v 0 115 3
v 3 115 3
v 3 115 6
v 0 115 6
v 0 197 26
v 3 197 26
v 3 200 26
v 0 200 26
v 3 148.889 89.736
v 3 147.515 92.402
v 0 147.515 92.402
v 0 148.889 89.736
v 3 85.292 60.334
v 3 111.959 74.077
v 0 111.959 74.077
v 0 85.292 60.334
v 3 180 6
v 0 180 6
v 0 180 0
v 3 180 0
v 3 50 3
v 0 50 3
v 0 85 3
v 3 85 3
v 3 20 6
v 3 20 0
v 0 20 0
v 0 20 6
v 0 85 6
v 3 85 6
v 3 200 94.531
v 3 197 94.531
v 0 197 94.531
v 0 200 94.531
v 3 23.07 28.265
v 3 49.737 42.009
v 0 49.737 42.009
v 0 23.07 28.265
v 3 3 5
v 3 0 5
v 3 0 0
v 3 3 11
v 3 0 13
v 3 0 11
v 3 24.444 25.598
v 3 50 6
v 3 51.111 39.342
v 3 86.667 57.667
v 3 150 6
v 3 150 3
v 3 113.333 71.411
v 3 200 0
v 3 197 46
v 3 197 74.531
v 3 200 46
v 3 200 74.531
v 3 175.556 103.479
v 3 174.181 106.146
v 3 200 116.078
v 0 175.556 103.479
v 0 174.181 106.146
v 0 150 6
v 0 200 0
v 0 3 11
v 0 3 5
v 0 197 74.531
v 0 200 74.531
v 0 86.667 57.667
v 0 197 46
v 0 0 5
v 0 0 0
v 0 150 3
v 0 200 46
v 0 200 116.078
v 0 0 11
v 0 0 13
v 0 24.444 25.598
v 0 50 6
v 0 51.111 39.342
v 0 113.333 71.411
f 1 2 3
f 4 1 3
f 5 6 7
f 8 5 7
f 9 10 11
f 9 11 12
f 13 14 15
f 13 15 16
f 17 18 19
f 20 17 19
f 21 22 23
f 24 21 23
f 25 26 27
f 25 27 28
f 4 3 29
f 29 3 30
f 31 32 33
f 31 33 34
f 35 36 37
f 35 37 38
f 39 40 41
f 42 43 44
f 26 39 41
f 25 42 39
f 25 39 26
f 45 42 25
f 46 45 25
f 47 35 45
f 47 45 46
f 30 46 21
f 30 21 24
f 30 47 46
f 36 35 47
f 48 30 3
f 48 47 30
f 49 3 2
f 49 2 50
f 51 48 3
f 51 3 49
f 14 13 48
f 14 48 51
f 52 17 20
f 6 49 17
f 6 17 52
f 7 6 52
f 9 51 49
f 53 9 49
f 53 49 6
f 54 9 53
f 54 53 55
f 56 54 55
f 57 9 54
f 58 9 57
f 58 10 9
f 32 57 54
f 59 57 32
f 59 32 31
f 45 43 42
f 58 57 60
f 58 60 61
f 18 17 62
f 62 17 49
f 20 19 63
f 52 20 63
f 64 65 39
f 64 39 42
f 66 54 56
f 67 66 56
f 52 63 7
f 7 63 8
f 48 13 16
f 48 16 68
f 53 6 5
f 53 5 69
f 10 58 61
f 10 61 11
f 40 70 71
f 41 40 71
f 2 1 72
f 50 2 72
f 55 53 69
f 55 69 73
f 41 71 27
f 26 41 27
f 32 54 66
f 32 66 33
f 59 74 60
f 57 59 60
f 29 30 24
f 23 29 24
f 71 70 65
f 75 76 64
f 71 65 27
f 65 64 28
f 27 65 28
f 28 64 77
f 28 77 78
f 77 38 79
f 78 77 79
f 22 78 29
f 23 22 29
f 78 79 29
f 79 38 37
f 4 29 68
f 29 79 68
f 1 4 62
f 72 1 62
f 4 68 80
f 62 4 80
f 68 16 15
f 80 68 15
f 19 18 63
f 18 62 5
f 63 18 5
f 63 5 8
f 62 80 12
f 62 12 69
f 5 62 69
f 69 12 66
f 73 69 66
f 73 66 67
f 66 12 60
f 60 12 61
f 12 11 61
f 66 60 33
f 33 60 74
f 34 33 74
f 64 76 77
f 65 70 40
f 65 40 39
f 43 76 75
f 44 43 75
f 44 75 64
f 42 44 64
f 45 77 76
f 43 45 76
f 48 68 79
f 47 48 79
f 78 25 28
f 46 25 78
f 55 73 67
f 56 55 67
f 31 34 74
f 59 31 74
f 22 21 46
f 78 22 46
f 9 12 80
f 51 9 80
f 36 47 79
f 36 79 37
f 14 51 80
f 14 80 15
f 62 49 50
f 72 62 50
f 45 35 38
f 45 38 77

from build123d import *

# Parameters (mm, degrees)
F1_DEPTH = 3
F2_W     = 3
F2_H     = 6
F3_DEPTH = 3.001
F4_W     = 30
F4_H     = 3
F5_DEPTH = 3.001
F6_W     = 3
F6_H     = 20
F7_DEPTH = 3.001
F9_DEPTH = 3


with BuildPart() as f1:
    # F0 (on Right) → F1 (new body)
    with BuildSketch(Plane.YZ):
        Polygon((200, 116.077641), (0, 13), (0, 0), (20, 0), (20, 3), (180, 3), (180, 0), (200, 0), (200, 13), align=None)
    extrude(amount=F1_DEPTH)

    # F2 (on Right) → F3 (cut, through all)
    with BuildSketch(Plane.YZ):
        with Locations((1.5, 8)):
            Rectangle(F2_W, F2_H)
    extrude(amount=F3_DEPTH, mode=Mode.SUBTRACT)

    # F4 (on face) → F5 (cut, through all)
    with BuildSketch(Plane.YZ.offset(3)):
        Polygon((115, 3), (115, 4.5), (115, 6), (85, 6), (85, 3), align=None)
        Polygon((180, 6), (150, 6), (150, 4.5), (150, 3), (180, 3), align=None)
        with Locations((35, 4.5)):
            Rectangle(F4_W, F4_H)
    extrude(amount=-F5_DEPTH, mode=Mode.SUBTRACT)

    # F6 (on face) → F7 (cut, through all)
    with BuildSketch(Plane.YZ.offset(3)):
        with Locations((198.5, 84.531476)):
            Rectangle(F6_W, F6_H)
        with Locations((198.5, 36)):
            Rectangle(F6_W, F6_H)
    extrude(amount=-F7_DEPTH, mode=Mode.SUBTRACT)

    # F8 (on face) → F9 (join, through all)
    with BuildSketch(Plane.YZ.offset(3)):
        Polygon((23.070076, 28.265045), (24.444444, 25.598378), (51.111111, 39.342064), (49.736743, 42.00873), align=None)
        Polygon((147.51452, 92.402244), (148.888889, 89.735577), (175.555556, 103.479262), (174.181187, 106.145929), align=None)
        Polygon((85.292298, 60.333644), (86.666667, 57.666978), (113.333333, 71.410663), (111.958965, 74.07733), align=None)
    extrude(amount=-F9_DEPTH)


solid = f1.part
